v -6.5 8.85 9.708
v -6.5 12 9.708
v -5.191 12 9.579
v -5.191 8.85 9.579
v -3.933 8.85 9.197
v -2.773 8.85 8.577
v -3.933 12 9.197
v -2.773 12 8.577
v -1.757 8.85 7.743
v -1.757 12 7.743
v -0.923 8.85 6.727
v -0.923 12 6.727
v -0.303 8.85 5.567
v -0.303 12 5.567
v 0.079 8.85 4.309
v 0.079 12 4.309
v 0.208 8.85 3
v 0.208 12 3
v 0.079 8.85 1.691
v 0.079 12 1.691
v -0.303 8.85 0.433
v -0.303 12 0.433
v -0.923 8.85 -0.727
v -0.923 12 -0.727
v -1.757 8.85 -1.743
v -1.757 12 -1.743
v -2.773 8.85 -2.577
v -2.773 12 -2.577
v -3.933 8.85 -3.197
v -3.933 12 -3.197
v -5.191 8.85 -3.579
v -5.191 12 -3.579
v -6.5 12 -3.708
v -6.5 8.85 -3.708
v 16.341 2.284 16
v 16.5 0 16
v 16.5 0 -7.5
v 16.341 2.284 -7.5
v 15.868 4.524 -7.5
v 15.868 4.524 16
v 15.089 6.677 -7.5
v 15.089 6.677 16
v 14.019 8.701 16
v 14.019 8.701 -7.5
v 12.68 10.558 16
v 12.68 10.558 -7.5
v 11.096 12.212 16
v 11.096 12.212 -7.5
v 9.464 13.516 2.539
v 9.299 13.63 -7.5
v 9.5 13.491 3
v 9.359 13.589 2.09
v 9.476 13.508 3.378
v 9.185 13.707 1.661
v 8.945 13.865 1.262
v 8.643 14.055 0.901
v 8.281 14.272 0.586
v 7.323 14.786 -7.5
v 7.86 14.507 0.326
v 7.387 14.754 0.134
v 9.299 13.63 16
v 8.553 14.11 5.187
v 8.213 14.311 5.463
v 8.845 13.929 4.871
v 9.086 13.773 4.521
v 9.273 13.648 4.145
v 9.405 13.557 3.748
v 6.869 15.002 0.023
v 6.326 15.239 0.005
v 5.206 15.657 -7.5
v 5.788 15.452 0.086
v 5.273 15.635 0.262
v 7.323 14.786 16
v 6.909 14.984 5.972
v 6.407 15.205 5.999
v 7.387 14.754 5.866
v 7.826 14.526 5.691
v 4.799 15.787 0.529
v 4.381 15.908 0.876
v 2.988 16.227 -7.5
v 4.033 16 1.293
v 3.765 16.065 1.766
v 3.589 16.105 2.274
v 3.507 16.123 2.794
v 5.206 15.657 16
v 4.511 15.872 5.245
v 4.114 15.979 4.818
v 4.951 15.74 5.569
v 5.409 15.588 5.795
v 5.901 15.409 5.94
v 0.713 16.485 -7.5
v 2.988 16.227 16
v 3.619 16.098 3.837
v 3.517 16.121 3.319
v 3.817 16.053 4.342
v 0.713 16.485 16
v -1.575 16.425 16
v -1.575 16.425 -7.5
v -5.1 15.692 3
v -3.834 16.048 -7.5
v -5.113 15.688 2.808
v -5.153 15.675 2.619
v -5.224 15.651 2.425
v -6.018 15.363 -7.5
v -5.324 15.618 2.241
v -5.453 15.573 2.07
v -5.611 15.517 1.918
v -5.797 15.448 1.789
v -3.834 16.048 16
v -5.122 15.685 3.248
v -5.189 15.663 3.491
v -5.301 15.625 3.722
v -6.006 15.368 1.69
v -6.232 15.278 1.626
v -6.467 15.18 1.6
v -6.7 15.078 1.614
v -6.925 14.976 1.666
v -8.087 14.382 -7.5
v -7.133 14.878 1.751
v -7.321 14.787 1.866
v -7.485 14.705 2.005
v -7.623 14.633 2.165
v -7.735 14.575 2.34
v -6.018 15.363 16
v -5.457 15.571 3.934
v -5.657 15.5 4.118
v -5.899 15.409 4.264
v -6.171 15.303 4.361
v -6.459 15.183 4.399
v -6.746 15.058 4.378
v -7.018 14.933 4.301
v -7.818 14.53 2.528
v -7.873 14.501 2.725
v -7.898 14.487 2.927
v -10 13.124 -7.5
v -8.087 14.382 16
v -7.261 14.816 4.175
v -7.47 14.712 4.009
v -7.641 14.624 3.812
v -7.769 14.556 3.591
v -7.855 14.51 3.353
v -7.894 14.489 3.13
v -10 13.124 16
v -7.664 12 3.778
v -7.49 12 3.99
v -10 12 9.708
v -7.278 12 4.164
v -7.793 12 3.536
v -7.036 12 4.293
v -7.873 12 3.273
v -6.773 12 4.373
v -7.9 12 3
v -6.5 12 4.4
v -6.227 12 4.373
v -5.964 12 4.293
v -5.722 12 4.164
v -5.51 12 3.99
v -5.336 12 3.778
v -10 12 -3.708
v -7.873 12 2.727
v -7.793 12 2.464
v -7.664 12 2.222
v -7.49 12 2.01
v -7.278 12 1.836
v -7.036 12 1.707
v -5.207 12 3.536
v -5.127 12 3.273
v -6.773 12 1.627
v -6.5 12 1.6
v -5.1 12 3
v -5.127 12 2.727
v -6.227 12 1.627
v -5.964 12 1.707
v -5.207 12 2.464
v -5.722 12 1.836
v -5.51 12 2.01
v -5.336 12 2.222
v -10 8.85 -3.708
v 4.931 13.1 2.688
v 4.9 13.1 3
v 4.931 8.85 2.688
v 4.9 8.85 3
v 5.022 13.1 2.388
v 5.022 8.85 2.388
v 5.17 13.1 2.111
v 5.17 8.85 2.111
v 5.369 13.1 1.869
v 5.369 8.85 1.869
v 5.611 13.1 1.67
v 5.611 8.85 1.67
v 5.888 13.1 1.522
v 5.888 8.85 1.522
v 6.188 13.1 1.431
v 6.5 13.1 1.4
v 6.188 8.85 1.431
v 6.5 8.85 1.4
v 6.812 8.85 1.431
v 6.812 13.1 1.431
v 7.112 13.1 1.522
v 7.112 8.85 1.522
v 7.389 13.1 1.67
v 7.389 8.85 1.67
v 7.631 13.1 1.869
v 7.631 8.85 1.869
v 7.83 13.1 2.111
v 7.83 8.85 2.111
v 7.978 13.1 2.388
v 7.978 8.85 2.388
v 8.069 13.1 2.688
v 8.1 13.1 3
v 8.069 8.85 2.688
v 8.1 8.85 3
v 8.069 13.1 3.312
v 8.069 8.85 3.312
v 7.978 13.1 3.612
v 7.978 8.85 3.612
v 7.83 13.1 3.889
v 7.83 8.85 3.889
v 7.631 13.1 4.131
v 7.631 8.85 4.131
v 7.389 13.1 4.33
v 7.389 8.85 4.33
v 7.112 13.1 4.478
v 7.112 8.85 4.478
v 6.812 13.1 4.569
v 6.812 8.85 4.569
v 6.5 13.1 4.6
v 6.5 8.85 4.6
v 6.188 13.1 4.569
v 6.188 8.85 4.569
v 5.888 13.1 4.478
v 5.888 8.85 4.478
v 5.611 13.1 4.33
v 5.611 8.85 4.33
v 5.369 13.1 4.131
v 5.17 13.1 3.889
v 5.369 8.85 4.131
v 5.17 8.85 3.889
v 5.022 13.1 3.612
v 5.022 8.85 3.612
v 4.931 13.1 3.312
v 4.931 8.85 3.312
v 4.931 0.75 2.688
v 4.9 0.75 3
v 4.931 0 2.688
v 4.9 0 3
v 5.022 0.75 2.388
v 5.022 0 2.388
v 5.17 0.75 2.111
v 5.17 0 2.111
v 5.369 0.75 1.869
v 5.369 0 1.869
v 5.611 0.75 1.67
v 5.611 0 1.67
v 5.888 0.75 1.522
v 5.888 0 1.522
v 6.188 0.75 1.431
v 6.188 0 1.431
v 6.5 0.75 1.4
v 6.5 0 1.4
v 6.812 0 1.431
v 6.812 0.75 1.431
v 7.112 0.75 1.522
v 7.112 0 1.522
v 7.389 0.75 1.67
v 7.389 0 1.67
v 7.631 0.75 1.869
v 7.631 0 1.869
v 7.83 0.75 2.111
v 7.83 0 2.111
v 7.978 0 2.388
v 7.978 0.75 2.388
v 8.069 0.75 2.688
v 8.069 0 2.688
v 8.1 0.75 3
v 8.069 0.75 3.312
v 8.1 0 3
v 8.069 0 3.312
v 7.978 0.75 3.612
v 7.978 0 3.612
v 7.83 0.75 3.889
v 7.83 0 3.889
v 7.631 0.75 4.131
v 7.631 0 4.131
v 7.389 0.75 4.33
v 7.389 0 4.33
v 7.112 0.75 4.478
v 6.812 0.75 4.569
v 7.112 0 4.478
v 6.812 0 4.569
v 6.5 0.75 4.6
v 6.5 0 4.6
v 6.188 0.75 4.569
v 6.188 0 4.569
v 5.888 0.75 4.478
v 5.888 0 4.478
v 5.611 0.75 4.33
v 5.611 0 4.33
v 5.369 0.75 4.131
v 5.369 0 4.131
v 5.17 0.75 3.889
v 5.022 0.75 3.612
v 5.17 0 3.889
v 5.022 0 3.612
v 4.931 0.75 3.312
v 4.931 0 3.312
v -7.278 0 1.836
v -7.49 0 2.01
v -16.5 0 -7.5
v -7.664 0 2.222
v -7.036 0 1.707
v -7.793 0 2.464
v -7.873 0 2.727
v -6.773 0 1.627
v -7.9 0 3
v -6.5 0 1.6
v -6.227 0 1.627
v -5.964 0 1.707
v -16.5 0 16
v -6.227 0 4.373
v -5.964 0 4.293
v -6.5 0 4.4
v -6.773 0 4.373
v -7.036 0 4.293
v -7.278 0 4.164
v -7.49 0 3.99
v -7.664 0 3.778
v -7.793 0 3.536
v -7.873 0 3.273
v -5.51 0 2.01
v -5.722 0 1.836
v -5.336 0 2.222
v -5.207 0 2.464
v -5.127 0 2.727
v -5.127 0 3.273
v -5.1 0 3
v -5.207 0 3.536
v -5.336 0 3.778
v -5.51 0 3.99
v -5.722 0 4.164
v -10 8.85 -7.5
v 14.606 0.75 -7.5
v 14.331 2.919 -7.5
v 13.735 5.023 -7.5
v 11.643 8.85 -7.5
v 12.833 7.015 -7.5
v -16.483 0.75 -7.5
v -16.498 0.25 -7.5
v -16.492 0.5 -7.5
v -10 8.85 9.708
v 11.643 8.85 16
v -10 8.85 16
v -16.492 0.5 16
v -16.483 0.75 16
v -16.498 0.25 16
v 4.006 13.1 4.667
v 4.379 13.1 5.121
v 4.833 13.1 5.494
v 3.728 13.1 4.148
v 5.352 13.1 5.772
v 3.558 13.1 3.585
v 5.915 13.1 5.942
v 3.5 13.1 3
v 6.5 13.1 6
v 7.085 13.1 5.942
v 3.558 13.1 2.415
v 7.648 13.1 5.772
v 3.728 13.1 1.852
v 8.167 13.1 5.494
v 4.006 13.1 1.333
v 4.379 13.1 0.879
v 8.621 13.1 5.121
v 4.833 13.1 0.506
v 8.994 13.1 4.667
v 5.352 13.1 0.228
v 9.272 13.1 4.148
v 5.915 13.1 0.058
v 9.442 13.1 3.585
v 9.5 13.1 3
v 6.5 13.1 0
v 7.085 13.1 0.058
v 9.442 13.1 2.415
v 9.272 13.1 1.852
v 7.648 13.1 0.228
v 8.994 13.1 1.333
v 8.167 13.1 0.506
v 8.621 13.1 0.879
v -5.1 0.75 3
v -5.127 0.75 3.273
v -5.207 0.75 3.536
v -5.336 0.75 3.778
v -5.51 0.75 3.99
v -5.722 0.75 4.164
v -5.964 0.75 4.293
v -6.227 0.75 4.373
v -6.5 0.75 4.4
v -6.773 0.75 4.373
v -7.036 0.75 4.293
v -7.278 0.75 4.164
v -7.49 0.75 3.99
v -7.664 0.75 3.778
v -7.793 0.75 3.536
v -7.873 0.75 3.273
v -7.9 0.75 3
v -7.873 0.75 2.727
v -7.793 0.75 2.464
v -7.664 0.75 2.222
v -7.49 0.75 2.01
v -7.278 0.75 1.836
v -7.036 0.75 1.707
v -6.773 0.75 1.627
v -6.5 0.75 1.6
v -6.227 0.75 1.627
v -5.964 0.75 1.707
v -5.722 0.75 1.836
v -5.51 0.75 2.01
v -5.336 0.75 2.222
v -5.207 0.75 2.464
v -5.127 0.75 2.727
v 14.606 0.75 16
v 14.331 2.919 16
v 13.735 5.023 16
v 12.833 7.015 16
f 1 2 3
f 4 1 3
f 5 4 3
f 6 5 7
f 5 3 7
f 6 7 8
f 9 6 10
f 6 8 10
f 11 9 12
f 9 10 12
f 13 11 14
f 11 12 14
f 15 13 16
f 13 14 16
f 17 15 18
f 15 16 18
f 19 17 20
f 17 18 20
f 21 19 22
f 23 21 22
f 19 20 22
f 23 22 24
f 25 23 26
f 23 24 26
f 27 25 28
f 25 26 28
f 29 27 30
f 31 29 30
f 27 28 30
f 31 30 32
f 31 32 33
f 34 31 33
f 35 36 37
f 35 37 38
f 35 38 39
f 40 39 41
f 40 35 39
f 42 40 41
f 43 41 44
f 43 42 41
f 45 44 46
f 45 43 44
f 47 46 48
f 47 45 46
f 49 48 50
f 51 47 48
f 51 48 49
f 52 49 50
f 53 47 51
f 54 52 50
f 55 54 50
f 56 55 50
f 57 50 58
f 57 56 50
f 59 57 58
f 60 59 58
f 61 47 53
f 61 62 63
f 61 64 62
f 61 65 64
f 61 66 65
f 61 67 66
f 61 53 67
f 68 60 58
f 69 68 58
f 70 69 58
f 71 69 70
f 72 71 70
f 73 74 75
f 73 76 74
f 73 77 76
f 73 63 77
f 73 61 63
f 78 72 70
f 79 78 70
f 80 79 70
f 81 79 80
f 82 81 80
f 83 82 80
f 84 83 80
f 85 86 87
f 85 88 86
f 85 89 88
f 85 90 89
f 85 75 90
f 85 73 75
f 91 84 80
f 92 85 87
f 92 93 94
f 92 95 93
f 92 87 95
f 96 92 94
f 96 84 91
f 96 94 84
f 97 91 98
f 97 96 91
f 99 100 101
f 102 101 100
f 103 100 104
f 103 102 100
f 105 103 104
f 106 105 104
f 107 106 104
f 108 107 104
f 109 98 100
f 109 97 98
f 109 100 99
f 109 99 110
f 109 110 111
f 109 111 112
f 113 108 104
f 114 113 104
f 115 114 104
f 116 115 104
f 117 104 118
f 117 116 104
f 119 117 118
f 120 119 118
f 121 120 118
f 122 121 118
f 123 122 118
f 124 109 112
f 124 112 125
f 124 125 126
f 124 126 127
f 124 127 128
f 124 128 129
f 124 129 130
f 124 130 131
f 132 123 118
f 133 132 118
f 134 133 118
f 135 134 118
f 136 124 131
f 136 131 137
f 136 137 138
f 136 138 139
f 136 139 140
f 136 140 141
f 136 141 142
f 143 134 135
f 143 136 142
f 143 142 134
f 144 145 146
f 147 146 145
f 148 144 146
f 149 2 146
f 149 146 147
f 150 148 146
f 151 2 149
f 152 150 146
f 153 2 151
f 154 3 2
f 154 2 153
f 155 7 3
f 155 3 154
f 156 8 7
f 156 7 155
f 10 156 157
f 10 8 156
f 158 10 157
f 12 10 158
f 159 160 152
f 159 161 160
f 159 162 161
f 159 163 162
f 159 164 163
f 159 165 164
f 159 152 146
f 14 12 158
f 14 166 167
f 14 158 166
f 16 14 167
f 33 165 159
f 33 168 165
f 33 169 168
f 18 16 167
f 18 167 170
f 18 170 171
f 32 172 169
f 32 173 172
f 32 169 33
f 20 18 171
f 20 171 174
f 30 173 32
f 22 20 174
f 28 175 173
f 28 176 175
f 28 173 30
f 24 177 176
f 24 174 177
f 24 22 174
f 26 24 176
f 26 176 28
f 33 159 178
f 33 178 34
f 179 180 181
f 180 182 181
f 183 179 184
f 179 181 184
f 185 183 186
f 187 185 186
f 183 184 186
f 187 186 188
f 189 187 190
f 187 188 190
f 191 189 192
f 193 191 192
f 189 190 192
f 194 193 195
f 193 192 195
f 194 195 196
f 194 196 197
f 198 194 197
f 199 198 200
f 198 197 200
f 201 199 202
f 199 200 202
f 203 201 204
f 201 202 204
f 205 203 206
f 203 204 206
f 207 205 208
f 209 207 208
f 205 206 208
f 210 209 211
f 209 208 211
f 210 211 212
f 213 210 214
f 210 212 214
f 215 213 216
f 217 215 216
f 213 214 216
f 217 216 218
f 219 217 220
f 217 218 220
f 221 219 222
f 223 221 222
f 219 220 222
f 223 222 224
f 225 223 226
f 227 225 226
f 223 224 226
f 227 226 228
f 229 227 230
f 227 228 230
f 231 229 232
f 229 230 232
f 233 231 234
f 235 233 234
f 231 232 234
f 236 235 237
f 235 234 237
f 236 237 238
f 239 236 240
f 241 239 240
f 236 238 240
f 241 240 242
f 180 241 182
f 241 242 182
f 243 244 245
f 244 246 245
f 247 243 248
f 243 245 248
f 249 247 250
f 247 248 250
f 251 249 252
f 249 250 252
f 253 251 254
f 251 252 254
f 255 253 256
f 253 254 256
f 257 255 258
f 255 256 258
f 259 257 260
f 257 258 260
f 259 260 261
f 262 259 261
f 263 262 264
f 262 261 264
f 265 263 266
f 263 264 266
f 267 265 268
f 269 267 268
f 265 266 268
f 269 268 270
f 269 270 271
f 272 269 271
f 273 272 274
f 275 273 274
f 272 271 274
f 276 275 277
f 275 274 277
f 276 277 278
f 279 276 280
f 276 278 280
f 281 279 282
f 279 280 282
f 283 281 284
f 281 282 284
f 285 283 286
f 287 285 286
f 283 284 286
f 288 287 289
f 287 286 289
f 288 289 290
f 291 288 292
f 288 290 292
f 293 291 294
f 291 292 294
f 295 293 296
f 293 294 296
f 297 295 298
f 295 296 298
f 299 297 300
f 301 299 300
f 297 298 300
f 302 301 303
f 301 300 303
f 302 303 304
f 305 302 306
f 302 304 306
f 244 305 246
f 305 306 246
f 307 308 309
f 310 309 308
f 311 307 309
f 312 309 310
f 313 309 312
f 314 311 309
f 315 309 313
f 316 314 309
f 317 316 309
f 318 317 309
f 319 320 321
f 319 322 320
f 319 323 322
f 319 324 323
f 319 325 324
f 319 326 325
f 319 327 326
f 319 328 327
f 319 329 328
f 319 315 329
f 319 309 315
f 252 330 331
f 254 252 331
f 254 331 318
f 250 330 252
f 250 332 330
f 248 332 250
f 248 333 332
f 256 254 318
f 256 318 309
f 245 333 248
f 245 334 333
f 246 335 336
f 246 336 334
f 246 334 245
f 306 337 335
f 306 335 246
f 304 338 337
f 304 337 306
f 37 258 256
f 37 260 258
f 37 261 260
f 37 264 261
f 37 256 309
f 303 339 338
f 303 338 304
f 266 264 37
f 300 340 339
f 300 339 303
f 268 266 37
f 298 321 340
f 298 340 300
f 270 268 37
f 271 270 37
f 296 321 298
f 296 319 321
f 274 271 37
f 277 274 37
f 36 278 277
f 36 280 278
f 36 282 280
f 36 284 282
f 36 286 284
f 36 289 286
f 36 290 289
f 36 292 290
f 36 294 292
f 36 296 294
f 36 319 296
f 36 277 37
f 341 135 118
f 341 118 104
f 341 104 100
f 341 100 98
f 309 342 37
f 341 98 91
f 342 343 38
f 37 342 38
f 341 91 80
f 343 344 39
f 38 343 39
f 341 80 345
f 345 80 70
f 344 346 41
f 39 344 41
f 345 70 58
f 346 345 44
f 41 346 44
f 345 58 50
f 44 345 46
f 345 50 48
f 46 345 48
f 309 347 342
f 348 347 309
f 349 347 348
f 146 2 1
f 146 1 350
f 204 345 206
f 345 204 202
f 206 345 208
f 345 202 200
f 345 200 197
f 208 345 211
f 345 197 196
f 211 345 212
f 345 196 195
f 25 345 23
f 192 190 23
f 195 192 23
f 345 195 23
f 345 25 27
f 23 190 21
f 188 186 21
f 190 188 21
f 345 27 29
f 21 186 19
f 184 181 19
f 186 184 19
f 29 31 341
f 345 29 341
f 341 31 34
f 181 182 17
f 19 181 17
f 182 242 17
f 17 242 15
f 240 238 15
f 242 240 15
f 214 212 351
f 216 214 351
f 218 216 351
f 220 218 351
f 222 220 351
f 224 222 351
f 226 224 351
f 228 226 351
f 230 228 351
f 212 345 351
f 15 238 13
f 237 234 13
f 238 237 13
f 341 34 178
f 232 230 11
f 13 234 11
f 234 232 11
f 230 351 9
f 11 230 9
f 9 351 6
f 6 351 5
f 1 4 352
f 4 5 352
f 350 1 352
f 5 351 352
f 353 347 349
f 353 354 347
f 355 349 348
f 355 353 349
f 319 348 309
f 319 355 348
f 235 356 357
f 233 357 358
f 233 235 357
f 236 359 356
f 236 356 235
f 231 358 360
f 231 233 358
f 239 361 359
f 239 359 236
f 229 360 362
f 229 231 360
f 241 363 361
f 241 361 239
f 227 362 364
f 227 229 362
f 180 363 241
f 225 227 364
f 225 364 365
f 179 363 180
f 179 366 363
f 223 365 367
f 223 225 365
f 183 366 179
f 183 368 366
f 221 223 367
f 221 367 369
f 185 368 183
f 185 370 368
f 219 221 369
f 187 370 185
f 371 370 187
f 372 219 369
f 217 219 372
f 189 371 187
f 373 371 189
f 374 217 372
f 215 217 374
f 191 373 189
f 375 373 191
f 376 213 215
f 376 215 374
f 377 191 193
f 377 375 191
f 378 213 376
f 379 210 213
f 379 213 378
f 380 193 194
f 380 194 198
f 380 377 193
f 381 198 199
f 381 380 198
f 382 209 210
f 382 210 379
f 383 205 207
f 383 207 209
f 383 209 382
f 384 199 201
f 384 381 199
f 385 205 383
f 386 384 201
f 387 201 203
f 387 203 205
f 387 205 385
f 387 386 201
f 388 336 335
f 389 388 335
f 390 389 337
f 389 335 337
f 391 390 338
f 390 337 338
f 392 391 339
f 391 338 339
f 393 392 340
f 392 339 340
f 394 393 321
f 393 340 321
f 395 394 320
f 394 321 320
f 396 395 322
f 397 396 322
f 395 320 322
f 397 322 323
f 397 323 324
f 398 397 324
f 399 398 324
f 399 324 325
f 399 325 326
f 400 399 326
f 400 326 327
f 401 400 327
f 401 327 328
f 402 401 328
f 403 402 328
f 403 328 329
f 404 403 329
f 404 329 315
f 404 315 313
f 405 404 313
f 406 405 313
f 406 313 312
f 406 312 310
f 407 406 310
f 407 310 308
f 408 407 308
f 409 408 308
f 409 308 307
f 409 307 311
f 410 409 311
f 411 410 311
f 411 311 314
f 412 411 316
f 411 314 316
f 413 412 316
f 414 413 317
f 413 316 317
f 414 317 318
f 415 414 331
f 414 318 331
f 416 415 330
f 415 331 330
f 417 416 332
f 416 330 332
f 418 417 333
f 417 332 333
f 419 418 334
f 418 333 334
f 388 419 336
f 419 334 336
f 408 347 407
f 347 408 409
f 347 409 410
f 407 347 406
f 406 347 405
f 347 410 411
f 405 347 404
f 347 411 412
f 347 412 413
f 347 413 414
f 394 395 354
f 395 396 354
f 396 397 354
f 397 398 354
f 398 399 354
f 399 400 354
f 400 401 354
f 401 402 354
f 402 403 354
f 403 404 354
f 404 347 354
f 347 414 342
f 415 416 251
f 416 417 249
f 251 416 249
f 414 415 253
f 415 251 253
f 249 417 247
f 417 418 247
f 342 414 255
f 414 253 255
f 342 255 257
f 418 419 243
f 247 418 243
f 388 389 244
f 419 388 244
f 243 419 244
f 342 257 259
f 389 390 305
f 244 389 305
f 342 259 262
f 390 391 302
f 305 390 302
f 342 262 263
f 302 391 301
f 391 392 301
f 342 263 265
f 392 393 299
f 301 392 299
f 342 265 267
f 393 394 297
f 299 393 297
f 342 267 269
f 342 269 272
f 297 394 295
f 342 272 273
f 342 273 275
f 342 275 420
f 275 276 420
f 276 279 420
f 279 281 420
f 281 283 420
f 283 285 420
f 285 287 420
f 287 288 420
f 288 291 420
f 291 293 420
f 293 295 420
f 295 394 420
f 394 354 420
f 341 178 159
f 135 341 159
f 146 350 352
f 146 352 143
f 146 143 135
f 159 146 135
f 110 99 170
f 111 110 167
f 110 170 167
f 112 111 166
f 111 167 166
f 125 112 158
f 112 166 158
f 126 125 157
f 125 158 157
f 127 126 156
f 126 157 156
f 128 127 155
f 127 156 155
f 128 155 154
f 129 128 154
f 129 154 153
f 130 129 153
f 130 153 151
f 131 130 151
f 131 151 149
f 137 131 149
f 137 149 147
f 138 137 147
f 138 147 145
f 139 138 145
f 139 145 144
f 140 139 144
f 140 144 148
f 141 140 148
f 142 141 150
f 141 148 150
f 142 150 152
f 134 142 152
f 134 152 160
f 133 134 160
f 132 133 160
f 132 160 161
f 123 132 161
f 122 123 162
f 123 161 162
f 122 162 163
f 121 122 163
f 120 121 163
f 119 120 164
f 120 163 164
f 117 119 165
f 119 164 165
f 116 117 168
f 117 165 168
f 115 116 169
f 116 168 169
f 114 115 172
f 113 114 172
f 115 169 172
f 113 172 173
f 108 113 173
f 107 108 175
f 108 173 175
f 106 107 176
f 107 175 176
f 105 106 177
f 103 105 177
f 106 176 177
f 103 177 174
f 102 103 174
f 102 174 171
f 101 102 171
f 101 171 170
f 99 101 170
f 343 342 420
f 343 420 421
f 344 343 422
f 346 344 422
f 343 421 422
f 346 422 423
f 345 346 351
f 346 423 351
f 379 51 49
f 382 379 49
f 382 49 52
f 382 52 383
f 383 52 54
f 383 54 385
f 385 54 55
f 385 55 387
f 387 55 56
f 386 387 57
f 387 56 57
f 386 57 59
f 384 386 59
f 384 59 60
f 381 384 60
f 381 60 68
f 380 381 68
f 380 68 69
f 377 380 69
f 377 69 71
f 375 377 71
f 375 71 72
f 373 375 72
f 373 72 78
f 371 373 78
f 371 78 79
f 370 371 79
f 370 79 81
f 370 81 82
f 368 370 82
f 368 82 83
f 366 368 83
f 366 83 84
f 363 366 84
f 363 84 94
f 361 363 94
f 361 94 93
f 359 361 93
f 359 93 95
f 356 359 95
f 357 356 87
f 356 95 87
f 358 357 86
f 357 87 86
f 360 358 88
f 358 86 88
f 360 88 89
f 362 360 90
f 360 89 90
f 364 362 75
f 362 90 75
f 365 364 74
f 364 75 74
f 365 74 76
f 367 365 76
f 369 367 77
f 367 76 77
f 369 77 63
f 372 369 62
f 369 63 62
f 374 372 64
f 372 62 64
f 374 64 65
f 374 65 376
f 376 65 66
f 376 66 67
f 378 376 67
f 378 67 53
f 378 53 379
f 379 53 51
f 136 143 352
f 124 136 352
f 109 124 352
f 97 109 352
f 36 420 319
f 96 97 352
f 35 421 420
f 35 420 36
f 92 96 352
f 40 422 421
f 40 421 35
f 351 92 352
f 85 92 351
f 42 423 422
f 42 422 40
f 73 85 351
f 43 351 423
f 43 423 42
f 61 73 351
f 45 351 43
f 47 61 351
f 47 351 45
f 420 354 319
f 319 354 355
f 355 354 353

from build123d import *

# Parameters (mm, degrees)
PAD009_DEPTH      = 16
PAD009_DEPTH_BACK = 7.5
POCKET_DEPTH      = 8
HOLE_D            = 3.2
HOLE_DEPTH        = 25
HOLE_CBORE_D      = 6
HOLE_CBORE_DEPTH  = 3.4
SKETCH045_R       = 1.4
POCKET016_DEPTH   = 16


with BuildPart() as part:
    # Sketch → Pad009 (new body, two sides)
    with BuildSketch(Plane.XY) as pad009_sk:
        with BuildLine():
            Line((-16.5, 0), (16.5, 0))
            ThreePointArc((16.5, 0), (7.3229092579, 14.7859730826), (-10, 13.1244047484))
            Line((-10, 8.85), (-10, 13.1244047484))
            Line((11.6433725784, 8.85), (-10, 8.85))
            ThreePointArc((14.6057565706, 0.75), (13.7352355375, 5.0233385044), (11.6433725784, 8.85))
            Line((-16.4829457319, 0.75), (14.6057565706, 0.75))
            ThreePointArc((-16.4829457319, 0.75), (-16.495735882, 0.3750969368), (-16.5, 0))
        make_face()
    extrude(amount=PAD009_DEPTH)
    extrude(pad009_sk.sketch, amount=-PAD009_DEPTH_BACK)

    # Sketch033 (on DatumPlane) → Pocket (cut)
    with BuildSketch(Plane.ZX.offset(12)):
        with BuildLine():
            Line((9.707631, -19.5547157413), (-3.707631, -19.5547157413))
            Line((-3.707631, -19.5547157413), (-3.707631, -6.5))
            ThreePointArc((9.707631, -6.5), (3, 0.207631), (-3.707631, -6.5))
            Line((9.707631, -6.5), (9.707631, -19.5547157413))
        make_face()
    extrude(amount=-POCKET_DEPTH, mode=Mode.SUBTRACT)

    # Hole
    with Locations(Plane(origin=(0, 16.5, 0), x_dir=(1, 0, 0), z_dir=(0, 1, 0))):
        with Locations((6.5, -3)):
            CounterBoreHole(HOLE_D / 2, HOLE_CBORE_D / 2, HOLE_CBORE_DEPTH, depth=HOLE_DEPTH)

    # Sketch045 → Pocket016 (cut)
    with BuildSketch(Plane.XZ):
        with Locations((-6.5, 3)):
            Circle(SKETCH045_R)
    extrude(amount=-POCKET016_DEPTH, mode=Mode.SUBTRACT)


solid = part.part
